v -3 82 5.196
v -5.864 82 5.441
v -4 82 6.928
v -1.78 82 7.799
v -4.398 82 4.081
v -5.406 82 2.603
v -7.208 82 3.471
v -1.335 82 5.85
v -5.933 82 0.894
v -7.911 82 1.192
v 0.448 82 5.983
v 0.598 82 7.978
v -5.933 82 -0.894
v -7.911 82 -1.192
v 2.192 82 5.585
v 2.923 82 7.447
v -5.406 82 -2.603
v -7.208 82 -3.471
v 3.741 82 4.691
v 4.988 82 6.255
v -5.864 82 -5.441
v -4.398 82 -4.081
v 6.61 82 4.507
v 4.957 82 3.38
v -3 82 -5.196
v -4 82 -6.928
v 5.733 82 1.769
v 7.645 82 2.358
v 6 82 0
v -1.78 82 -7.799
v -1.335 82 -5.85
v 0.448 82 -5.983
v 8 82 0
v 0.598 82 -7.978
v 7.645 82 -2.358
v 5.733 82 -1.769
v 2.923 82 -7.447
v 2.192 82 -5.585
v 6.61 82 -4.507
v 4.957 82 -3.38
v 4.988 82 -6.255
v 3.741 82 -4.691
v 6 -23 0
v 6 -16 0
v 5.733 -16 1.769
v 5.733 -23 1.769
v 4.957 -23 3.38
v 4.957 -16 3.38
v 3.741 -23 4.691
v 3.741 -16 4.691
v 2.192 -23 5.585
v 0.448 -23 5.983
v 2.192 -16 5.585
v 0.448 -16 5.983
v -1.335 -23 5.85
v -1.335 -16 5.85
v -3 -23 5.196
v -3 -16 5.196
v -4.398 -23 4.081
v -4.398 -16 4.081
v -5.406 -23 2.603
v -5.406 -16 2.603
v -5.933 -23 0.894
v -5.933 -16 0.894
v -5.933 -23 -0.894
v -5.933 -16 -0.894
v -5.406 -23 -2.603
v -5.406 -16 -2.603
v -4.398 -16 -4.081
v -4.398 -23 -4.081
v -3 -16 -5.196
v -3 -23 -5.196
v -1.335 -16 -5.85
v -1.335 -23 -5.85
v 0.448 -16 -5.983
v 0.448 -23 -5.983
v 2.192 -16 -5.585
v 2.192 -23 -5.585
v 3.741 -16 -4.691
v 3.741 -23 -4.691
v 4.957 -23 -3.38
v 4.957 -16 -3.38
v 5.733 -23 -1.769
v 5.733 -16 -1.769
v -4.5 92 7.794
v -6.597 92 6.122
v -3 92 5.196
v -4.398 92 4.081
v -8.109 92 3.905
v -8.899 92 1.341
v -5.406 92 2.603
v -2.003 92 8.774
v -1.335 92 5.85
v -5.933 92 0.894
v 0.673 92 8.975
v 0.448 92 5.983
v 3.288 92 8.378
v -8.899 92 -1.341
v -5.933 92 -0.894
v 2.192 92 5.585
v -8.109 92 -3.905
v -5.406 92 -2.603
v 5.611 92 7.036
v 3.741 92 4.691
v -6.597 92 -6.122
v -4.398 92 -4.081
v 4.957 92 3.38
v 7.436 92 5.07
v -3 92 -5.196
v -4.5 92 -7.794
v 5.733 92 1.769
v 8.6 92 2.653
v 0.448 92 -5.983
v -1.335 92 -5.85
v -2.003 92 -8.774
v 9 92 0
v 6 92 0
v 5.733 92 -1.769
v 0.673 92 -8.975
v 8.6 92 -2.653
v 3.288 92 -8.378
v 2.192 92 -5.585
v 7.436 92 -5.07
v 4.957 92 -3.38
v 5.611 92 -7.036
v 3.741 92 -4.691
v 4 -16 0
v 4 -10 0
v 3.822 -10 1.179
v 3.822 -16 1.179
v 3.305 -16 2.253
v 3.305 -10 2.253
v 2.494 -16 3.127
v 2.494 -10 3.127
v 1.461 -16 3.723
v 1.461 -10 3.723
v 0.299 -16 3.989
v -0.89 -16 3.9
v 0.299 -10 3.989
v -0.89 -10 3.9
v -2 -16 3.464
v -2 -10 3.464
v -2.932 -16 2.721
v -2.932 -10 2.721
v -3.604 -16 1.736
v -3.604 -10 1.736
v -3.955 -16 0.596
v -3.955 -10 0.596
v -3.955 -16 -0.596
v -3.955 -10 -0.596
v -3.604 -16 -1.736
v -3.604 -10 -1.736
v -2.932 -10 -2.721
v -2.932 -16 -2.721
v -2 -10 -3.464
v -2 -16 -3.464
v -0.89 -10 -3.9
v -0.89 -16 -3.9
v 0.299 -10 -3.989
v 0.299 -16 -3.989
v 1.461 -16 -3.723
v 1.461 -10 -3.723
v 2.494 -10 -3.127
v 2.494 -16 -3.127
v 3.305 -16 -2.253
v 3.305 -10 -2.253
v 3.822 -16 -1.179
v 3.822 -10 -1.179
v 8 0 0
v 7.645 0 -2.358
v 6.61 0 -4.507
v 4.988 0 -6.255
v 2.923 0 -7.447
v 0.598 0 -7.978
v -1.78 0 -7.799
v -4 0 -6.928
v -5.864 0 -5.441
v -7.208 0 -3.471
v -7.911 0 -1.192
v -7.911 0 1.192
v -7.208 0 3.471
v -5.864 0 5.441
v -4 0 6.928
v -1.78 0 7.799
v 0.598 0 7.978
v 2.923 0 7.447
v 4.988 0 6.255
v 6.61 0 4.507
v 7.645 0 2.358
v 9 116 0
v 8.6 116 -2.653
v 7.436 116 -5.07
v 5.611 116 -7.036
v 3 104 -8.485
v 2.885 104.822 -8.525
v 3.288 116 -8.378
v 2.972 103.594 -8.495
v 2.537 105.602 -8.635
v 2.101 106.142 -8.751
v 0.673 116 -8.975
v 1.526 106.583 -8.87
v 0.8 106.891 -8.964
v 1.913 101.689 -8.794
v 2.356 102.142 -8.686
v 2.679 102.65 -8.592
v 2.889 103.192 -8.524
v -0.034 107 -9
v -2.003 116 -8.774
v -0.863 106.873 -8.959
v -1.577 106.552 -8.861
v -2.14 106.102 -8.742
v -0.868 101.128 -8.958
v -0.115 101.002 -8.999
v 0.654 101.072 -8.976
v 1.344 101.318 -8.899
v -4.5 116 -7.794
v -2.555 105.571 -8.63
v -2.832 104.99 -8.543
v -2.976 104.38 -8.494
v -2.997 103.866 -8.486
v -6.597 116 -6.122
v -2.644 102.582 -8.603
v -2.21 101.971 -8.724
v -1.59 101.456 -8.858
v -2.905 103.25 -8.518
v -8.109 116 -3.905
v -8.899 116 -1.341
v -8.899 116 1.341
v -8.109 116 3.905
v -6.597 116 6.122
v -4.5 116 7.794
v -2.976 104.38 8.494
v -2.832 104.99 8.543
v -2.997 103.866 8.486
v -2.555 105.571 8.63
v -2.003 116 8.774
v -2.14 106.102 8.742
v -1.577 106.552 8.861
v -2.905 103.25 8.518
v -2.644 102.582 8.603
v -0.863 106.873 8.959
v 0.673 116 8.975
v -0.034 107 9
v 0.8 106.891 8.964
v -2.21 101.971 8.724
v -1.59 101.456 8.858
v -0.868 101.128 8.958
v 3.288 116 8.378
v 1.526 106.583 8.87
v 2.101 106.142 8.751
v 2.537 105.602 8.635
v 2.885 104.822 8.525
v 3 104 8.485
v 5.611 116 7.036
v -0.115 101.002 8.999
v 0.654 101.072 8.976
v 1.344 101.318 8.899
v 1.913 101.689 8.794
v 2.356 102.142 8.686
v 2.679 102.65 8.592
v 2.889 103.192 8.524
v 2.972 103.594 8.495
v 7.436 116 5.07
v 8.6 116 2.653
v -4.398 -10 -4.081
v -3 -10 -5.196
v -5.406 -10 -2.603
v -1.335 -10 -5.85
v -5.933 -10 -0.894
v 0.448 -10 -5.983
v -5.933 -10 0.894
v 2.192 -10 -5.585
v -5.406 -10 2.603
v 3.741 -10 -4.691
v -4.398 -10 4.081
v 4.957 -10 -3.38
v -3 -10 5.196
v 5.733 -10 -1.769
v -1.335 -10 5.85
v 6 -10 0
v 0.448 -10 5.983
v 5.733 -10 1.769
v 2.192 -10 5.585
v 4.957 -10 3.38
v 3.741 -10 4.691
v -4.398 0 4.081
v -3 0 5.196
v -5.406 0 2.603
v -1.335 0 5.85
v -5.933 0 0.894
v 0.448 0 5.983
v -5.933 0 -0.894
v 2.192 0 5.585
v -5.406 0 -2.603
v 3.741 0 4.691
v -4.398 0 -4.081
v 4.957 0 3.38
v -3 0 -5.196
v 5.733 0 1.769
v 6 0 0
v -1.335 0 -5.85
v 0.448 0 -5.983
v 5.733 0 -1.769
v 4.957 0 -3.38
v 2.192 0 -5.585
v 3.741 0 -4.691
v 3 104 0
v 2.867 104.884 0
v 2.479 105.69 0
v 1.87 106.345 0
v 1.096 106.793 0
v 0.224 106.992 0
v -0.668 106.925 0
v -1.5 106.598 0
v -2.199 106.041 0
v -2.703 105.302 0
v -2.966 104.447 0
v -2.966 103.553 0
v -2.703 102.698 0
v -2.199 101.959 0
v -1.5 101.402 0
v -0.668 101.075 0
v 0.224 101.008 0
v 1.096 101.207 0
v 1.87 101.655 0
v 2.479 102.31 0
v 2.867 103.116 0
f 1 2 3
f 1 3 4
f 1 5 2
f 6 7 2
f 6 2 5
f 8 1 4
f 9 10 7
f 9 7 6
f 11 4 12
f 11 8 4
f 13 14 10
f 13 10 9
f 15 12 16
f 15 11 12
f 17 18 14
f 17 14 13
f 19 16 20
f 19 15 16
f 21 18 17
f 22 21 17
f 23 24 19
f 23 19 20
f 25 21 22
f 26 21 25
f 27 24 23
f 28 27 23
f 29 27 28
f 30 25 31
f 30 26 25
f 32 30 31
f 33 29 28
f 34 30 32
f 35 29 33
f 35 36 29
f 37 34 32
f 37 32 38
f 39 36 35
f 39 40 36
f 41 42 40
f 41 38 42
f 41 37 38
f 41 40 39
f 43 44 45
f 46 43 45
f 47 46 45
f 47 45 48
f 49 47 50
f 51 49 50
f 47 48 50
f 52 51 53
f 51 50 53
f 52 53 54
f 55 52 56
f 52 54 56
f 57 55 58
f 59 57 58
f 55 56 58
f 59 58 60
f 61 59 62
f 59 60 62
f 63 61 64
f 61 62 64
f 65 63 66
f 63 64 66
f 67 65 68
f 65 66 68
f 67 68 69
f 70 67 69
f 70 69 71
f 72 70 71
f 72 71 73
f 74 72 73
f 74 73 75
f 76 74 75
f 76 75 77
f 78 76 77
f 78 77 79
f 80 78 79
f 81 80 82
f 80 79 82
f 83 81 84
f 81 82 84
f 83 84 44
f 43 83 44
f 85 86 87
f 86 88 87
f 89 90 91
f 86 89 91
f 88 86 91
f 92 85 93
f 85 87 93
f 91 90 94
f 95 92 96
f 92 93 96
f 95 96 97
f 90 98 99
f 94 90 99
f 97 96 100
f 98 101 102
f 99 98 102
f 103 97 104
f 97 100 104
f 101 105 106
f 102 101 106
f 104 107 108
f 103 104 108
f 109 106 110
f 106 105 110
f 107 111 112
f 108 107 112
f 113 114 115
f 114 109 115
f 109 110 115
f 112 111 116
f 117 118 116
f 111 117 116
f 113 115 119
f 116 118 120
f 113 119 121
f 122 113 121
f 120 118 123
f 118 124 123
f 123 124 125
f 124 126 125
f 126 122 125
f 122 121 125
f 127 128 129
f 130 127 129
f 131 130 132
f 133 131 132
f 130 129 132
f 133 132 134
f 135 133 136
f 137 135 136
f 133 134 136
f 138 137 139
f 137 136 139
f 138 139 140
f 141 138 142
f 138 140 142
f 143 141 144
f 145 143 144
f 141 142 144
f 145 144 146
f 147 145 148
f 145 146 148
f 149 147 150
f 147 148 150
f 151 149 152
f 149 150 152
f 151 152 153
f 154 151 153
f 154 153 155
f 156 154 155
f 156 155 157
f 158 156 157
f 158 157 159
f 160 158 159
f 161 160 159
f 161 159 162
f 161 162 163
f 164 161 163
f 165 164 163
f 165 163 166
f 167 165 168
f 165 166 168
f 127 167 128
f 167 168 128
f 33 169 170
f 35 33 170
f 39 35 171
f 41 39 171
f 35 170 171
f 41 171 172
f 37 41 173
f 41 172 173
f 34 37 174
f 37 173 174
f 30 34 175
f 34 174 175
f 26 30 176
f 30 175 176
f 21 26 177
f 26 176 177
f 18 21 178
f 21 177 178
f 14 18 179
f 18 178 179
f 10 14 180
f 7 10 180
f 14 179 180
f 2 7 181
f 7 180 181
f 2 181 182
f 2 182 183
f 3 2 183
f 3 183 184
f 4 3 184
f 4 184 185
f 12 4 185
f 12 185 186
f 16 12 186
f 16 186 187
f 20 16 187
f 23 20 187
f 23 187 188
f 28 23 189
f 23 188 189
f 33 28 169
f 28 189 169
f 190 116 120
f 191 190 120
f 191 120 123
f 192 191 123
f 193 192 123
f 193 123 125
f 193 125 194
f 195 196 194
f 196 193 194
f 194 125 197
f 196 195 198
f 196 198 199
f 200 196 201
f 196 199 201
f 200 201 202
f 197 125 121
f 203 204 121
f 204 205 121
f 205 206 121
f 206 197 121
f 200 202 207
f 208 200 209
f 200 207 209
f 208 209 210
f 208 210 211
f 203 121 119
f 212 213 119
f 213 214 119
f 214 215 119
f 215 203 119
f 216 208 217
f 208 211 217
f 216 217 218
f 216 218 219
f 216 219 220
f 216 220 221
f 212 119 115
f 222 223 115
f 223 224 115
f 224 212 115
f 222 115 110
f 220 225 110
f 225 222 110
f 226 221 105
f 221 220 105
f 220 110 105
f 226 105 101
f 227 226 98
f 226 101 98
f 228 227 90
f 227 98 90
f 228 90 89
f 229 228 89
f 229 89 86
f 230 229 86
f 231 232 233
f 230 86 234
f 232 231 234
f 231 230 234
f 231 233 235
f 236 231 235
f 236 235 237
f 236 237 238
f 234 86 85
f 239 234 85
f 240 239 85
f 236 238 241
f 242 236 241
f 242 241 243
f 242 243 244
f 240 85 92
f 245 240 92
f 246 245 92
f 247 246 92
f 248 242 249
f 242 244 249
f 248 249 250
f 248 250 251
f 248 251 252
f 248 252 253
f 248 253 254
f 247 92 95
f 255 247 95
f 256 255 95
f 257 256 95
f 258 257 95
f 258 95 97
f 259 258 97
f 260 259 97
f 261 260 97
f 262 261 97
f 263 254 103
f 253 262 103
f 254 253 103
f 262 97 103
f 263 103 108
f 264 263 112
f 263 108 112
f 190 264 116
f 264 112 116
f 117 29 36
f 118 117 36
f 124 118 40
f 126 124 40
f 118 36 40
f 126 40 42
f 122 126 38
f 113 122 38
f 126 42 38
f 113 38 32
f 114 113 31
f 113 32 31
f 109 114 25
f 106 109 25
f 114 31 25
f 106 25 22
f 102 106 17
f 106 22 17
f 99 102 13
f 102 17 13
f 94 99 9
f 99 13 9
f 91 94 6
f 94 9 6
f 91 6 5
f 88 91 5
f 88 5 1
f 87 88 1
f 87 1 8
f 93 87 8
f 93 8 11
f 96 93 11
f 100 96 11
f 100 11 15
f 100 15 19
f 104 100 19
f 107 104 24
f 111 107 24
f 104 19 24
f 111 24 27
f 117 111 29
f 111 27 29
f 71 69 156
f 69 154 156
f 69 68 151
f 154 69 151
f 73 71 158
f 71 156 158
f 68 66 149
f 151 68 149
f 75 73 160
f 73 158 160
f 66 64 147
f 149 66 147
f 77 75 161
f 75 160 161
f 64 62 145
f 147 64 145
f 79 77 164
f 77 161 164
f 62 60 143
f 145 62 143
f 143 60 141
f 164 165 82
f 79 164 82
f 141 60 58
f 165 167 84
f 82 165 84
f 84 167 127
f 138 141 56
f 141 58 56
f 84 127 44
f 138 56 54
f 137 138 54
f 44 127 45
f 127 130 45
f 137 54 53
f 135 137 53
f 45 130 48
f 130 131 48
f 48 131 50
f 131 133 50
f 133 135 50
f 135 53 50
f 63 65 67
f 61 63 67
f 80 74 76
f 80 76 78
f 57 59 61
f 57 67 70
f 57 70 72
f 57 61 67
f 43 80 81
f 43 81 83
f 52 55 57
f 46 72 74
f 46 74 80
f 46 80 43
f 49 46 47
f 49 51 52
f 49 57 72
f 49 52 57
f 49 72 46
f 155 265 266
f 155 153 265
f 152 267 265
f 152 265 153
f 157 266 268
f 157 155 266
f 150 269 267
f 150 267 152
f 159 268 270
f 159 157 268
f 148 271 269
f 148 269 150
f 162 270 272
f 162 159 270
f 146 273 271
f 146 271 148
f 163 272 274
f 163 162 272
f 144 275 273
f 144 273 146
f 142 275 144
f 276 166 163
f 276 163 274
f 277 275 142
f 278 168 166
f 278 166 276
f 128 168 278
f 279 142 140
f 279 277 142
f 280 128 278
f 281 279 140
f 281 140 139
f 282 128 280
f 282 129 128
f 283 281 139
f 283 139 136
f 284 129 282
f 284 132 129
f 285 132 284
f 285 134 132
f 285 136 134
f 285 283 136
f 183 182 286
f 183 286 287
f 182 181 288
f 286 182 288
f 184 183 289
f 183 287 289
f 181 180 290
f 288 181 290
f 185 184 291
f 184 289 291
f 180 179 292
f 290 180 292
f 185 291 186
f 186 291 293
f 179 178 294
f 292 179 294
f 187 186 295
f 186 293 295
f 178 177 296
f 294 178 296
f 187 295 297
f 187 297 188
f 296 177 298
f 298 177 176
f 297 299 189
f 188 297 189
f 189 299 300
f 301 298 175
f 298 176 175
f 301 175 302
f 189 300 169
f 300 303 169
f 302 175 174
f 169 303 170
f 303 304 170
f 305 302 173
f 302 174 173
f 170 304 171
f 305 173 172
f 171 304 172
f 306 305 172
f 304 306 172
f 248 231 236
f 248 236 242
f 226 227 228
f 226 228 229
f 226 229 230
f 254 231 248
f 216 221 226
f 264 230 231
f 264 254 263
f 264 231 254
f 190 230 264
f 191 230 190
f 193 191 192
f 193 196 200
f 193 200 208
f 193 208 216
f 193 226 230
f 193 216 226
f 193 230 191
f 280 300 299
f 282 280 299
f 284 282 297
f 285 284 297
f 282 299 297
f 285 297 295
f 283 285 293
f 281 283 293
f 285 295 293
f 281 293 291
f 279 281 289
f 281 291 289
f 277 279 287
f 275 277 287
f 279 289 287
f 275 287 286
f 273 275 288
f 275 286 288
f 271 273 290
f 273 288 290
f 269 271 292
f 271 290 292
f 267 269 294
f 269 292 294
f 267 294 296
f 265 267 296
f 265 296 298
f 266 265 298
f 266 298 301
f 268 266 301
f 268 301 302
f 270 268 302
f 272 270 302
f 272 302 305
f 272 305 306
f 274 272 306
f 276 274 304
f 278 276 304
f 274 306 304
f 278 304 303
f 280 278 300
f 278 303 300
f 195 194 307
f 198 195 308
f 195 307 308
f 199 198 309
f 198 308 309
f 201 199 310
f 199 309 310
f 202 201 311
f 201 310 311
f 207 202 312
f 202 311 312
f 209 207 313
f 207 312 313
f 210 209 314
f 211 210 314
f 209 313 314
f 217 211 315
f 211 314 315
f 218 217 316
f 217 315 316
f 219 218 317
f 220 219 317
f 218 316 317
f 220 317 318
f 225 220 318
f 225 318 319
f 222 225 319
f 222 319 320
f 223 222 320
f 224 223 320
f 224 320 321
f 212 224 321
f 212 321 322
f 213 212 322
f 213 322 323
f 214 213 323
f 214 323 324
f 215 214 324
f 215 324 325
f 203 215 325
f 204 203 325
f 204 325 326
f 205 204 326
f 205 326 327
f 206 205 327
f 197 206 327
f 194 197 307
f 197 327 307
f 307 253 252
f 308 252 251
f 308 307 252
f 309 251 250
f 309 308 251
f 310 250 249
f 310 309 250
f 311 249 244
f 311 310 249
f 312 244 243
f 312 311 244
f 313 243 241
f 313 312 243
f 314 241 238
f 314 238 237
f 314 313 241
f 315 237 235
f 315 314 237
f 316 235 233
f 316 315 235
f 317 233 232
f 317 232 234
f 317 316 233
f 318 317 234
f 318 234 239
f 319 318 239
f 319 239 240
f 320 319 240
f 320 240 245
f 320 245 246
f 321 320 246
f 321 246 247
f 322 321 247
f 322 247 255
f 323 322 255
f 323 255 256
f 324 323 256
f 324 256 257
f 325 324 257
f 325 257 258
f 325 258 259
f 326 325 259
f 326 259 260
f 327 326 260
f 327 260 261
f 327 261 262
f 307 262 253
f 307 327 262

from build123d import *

# Parameters (mm, degrees)
SKETCH1_R               = 8
BOSS_EXTRUDE1_DEPTH     = 82
SKETCH2_R               = 6
BOSS_EXTRUDE2_DEPTH     = 10
SKETCH4_R               = 9
BOSS_EXTRUDE3_DEPTH     = 24
SKETCH5_R               = 6
BOSS_EXTRUDE4_DEPTH     = 10
SKETCH6_R               = 4
BOSS_EXTRUDE5_DEPTH     = 6
SKETCH7_R               = 6
BOSS_EXTRUDE6_DEPTH     = 7
SKETCH8_R               = 3
CUT_EXTRUDE2_DEPTH      = 10
CUT_EXTRUDE2_DEPTH_BACK = 10


with BuildPart() as part:
    # Sketch1 → Boss-Extrude1 (new body)
    with BuildSketch(Plane(origin=(0, 0, 0), x_dir=(1, 0, 0), z_dir=(0, 1, 0))):
        Circle(SKETCH1_R)
    extrude(amount=BOSS_EXTRUDE1_DEPTH)

    # Sketch2 → Boss-Extrude2 (add)
    with BuildSketch(Plane(origin=(0, 82, 0), x_dir=(1, 0, 0), z_dir=(0, 1, 0))):
        Circle(SKETCH2_R)
    extrude(amount=BOSS_EXTRUDE2_DEPTH)

    # Sketch4 → Boss-Extrude3 (add)
    with BuildSketch(Plane(origin=(0, 92, 0), x_dir=(1, 0, 0), z_dir=(0, 1, 0))):
        Circle(SKETCH4_R)
    extrude(amount=BOSS_EXTRUDE3_DEPTH)

    # Sketch5 → Boss-Extrude4 (add)
    with BuildSketch(Plane.XZ):
        Circle(SKETCH5_R)
    extrude(amount=BOSS_EXTRUDE4_DEPTH)

    # Sketch6 → Boss-Extrude5 (add)
    with BuildSketch(Plane.XZ.offset(10)):
        Circle(SKETCH6_R)
    extrude(amount=BOSS_EXTRUDE5_DEPTH)

    # Sketch7 → Boss-Extrude6 (add)
    with BuildSketch(Plane.XZ.offset(16)):
        Circle(SKETCH7_R)
    extrude(amount=BOSS_EXTRUDE6_DEPTH)

    # Sketch8 → Cut-Extrude2 (cut, two sides)
    with BuildSketch(Plane.XY) as cut_extrude2_sk:
        with Locations((0, 104)):
            Circle(SKETCH8_R)
    extrude(amount=CUT_EXTRUDE2_DEPTH, mode=Mode.SUBTRACT)
    extrude(cut_extrude2_sk.sketch, amount=-CUT_EXTRUDE2_DEPTH_BACK, mode=Mode.SUBTRACT)


solid = part.part
